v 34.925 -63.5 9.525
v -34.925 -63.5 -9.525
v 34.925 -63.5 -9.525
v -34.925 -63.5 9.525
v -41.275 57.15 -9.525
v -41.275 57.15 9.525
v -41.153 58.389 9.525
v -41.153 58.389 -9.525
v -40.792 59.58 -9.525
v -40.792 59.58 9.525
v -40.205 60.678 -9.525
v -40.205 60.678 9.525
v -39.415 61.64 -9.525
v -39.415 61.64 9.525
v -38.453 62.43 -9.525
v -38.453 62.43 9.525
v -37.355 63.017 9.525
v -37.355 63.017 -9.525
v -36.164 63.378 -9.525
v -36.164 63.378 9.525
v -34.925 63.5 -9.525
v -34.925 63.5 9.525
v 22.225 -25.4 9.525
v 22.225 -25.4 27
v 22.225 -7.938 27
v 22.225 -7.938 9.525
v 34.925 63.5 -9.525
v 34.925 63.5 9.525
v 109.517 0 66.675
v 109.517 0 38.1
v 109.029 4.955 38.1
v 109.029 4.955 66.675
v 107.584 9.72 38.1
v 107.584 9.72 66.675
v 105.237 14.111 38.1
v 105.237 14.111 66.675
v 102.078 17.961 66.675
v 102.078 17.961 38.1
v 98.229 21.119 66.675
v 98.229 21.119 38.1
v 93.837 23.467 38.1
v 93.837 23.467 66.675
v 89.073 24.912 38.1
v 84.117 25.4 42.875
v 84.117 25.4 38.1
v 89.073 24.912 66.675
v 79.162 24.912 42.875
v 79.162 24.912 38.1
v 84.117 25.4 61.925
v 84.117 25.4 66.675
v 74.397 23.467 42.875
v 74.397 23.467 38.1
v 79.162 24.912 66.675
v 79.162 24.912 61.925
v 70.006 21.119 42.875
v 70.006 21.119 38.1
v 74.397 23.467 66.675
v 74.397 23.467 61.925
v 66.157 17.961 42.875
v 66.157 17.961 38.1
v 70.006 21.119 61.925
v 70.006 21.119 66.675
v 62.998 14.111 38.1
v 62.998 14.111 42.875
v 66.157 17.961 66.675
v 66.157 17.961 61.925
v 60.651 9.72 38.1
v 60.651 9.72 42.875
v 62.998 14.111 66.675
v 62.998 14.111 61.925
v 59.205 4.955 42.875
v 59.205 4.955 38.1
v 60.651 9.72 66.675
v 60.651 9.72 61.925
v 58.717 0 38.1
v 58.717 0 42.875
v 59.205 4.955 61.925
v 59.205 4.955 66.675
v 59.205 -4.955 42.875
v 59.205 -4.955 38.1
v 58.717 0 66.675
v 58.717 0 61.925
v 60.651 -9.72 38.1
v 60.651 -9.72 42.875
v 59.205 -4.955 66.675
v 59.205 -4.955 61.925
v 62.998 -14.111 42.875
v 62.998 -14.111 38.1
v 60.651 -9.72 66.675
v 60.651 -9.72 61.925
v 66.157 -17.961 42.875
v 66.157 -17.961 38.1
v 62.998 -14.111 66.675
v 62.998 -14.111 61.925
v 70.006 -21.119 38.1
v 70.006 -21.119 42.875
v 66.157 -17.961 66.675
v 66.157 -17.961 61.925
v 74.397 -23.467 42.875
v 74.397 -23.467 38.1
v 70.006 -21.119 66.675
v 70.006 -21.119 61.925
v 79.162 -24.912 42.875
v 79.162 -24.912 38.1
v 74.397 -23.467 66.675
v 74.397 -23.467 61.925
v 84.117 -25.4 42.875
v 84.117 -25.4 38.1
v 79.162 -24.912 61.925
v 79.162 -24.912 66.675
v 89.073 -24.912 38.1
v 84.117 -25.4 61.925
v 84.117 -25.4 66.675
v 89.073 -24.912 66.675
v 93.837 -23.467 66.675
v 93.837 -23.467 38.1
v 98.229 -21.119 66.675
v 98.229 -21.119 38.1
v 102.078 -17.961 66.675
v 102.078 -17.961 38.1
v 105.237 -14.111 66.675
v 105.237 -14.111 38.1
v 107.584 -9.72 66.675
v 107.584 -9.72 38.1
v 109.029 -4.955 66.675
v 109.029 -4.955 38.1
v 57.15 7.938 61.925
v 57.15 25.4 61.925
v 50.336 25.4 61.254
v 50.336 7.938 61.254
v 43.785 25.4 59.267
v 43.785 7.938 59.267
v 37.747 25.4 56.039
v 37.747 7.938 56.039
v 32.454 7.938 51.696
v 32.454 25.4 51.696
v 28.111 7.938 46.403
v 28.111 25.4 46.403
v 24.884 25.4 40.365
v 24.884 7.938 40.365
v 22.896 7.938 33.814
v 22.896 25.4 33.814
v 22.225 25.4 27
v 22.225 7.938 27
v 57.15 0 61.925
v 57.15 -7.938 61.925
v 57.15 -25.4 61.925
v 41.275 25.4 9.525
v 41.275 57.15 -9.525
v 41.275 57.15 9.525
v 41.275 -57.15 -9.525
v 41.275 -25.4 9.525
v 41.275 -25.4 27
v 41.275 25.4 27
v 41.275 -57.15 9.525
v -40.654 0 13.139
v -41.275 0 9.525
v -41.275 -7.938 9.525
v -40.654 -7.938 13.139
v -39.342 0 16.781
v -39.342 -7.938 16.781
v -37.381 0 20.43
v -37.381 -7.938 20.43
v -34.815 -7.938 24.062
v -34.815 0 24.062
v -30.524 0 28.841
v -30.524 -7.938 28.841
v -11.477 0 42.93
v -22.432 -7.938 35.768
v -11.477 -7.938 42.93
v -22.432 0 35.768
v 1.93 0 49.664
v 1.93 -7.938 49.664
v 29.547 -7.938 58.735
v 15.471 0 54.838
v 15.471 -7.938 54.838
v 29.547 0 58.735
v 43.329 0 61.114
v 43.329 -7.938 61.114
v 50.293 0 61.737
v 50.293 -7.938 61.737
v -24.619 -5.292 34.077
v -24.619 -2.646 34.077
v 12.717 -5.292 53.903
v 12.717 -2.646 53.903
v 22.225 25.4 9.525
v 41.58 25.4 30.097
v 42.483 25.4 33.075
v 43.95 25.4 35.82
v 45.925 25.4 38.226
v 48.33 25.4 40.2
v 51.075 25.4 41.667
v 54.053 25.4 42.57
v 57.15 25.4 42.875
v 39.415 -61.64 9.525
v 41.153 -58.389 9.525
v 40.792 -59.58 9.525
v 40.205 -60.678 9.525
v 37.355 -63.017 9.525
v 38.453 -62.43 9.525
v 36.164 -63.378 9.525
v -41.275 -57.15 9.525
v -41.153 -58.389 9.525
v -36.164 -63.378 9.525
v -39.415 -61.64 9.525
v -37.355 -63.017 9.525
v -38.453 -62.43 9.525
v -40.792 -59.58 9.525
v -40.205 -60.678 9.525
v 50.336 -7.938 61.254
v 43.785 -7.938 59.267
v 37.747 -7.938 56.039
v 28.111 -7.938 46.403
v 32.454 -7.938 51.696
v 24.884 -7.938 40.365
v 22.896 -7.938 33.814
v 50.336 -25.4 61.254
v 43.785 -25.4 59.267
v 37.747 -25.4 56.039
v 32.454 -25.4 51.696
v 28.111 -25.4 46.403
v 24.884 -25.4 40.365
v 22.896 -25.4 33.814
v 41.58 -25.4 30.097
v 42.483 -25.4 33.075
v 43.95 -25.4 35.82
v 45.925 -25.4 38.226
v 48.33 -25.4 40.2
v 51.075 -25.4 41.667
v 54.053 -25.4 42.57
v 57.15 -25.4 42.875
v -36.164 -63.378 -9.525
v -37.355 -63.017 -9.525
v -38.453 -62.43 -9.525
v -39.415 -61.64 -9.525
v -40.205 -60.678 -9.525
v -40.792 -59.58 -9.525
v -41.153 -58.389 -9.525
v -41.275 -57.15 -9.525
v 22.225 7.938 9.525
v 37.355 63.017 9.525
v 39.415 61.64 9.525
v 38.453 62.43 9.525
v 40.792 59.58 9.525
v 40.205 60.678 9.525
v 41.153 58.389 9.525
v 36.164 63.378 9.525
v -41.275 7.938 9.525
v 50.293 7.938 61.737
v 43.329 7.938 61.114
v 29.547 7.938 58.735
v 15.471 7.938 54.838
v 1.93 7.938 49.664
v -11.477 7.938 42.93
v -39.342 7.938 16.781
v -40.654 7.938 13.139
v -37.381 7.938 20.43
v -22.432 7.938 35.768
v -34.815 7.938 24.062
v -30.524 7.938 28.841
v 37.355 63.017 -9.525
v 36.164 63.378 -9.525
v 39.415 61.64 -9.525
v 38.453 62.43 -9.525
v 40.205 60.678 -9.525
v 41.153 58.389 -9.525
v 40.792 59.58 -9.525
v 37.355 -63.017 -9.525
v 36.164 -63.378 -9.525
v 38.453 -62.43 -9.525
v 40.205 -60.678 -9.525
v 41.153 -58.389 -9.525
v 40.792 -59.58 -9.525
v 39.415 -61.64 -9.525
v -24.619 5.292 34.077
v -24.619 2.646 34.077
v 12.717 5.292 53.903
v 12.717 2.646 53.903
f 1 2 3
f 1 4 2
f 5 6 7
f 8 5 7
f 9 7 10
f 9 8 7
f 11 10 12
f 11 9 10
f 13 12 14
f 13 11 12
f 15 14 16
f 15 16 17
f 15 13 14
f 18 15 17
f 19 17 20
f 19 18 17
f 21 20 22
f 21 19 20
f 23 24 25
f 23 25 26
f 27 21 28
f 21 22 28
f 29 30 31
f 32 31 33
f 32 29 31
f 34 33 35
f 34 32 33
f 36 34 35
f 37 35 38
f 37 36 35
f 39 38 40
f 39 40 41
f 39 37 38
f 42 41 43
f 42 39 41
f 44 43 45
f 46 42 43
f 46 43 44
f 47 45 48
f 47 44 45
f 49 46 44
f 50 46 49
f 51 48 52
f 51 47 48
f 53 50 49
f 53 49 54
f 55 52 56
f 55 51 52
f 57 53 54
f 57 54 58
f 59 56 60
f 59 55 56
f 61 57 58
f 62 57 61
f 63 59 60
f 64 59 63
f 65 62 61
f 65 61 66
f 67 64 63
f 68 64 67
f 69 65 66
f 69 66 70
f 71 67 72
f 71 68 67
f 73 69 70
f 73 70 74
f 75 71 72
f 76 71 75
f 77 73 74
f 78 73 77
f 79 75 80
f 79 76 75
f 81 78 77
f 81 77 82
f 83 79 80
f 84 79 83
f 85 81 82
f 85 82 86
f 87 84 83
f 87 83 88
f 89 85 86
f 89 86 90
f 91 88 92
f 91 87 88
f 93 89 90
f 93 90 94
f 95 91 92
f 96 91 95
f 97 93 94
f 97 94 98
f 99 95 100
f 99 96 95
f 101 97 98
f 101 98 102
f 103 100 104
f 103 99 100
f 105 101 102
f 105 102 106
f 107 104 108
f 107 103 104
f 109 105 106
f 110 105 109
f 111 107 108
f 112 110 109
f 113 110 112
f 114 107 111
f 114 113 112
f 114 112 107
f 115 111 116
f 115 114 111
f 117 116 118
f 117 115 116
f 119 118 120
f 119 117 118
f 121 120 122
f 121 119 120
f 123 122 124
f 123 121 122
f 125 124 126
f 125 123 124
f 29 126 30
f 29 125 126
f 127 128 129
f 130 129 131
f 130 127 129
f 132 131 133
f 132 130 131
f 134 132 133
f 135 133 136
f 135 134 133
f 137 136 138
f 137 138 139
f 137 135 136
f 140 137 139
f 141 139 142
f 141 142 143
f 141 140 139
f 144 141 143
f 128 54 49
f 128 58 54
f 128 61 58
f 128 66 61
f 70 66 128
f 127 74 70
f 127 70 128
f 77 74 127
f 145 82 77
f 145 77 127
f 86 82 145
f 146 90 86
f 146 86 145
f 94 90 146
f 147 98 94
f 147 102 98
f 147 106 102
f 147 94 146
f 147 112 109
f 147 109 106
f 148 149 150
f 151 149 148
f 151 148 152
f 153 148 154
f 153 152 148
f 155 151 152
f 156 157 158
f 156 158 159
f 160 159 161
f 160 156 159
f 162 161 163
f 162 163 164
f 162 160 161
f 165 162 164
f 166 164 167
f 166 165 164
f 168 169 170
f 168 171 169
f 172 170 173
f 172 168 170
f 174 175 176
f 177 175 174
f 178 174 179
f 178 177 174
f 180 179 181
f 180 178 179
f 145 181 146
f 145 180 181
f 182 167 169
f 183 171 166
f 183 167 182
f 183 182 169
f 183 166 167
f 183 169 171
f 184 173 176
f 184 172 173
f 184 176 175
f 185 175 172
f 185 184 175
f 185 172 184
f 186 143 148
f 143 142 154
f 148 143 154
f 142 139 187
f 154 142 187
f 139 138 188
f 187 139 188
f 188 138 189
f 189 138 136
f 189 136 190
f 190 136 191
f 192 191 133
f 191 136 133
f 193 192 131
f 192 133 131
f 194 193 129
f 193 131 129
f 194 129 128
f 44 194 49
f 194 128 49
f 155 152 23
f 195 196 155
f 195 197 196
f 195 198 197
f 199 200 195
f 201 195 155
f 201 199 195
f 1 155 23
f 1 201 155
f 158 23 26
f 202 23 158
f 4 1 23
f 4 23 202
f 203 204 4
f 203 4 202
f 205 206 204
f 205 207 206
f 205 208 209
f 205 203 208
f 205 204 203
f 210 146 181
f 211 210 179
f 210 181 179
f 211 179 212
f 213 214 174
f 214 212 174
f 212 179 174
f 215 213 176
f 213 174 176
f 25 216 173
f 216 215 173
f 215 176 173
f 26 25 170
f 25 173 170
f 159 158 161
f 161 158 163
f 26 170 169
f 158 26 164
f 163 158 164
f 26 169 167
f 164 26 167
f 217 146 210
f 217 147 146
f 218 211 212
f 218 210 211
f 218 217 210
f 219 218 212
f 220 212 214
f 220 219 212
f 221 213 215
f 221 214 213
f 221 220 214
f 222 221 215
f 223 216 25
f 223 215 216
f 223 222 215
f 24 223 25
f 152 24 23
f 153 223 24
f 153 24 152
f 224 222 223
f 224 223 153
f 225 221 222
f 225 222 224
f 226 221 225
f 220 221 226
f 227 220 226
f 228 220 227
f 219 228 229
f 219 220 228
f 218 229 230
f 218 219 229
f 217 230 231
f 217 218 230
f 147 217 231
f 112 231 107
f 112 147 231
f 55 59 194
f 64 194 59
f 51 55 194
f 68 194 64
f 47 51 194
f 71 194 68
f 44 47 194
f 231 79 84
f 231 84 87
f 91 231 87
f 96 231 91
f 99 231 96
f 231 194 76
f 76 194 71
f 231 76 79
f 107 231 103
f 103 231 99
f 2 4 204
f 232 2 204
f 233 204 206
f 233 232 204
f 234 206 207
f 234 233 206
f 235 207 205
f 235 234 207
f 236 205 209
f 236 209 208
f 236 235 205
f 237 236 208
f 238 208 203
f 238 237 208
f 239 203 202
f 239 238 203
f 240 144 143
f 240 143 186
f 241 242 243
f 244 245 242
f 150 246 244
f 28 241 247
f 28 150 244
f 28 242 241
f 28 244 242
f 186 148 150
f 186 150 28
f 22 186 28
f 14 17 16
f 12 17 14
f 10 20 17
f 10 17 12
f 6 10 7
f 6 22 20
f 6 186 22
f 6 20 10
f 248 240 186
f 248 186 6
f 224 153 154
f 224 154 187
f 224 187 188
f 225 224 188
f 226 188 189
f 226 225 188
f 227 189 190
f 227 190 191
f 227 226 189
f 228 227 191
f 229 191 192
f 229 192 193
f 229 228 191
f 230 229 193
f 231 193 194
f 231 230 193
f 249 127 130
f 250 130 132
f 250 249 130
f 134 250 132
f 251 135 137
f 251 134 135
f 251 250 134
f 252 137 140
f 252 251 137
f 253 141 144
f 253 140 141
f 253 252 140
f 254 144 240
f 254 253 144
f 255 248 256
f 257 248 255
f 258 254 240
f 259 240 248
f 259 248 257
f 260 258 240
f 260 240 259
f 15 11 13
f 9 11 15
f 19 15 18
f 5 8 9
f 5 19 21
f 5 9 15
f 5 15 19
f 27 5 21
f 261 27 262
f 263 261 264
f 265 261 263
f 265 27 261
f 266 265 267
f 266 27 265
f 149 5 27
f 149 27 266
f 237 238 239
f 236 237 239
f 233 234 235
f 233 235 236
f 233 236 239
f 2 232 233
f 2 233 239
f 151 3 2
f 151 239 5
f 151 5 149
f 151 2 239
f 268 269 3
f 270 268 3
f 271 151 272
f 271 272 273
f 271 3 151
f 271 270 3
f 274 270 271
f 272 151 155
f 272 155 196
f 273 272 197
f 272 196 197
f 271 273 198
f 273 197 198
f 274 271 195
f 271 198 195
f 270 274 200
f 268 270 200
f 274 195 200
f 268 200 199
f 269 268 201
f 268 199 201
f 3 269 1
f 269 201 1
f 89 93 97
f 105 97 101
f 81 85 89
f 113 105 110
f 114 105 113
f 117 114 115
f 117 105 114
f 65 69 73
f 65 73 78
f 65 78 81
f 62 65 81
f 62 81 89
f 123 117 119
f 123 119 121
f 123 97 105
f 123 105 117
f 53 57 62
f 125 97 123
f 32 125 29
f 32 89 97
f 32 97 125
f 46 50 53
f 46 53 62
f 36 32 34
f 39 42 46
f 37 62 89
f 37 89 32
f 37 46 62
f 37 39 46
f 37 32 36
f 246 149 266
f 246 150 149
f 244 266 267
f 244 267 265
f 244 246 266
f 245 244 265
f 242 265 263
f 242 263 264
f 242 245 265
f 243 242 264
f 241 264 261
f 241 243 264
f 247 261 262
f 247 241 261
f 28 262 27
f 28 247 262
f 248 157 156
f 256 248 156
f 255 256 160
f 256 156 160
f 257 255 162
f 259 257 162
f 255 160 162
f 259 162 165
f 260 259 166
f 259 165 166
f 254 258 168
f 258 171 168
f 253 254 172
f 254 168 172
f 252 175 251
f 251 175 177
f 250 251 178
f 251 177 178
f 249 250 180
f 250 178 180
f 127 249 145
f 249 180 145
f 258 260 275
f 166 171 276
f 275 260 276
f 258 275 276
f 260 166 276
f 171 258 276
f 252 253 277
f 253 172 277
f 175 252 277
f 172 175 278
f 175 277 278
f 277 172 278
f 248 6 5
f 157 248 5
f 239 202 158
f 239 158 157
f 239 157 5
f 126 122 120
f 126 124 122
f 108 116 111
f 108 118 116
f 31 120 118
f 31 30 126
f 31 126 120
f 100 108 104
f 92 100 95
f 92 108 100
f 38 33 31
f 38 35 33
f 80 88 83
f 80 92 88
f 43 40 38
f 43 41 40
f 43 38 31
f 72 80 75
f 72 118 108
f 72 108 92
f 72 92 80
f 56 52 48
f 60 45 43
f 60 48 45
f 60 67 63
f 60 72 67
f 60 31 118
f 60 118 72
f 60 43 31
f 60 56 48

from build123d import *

# Parameters (mm, degrees)
F1_DEPTH = 63.5
F0_W     = 25.4
F0_H     = 19.05
F2_DEPTH = 25.4
F3_DEPTH = 7.9375
F5_R     = 6.35


with BuildPart() as f1:
    # F0 (on Front) → F1 (new body, symmetric)
    with BuildSketch(Plane.XZ):
        Polygon((-41.275, -9.525), (41.275, -9.525), (41.275, 9.525), (22.225, 9.525), (-41.275, 9.525), align=None)
    extrude(amount=F1_DEPTH, both=True)

    # F0 (on Front) → F2 (join, symmetric)
    with BuildSketch(Plane.XZ):
        with BuildLine():
            Line((22.225, 9.525), (41.275, 9.525))
            Line((41.275, 9.525), (41.275, 27.0002))
            ThreePointArc((41.275, 27.0002), (45.9246798487, 38.2255201513), (57.15, 42.8752))
            Line((57.15, 42.8752), (58.7173181552, 42.8752))
            Line((58.7173181552, 42.8752), (58.7173181552, 61.9252))
            Line((58.7173181552, 61.9252), (57.15, 61.9252))
            ThreePointArc((57.15, 61.9252), (32.4542956671, 51.6959043329), (22.225, 27.0002))
            Line((22.225, 27.0002), (22.225, 9.525))
        make_face()
        with Locations((71.4173181552, 52.4002)):
            Rectangle(F0_W, F0_H)
    extrude(amount=F2_DEPTH, both=True)

    # F0 (on Front) → F3 (join, symmetric)
    with BuildSketch(Plane.XZ):
        with BuildLine():
            add(Edge.make_bspline(
                [(-41.275, 9.525), (-39.4876301289, 34.0806692839), (13.6961471289, 62.1632300317), (57.15, 61.9252)],
                knots=[0, 0, 0, 0, 111.5045361635, 111.5045361635, 111.5045361635, 111.5045361635], degree=3))
            Line((-41.275, 9.525), (22.225, 9.525))
            Line((22.225, 9.525), (22.225, 27.0002))
            ThreePointArc((22.225, 27.0002), (32.4542956671, 51.6959043329), (57.15, 61.9252))
        make_face()
    extrude(amount=F3_DEPTH, both=True)

    # F0 (on Front) → F4 (revolve)
    with BuildSketch(Plane.XZ):
        Polygon((84.1173181552, 66.675), (84.1173181552, 61.9252), (84.1173181552, 42.8752), (84.1173181552, 38.1), (109.5173181552, 38.1), (109.5173181552, 66.675), align=None)
    revolve(axis=Axis((84.1173181552, 0, 52.3875), (0, 0, 1)))

    # F5
    f5_edges = [f1.edges().sort_by_distance(p)[0] for p in [
        (41.275, -63.5, 0),
        (-41.275, -63.5, 0),
        (41.275, 63.5, 0),
        (-41.275, 63.5, 0),
    ]]
    fillet(f5_edges, radius=F5_R)


solid = f1.part
